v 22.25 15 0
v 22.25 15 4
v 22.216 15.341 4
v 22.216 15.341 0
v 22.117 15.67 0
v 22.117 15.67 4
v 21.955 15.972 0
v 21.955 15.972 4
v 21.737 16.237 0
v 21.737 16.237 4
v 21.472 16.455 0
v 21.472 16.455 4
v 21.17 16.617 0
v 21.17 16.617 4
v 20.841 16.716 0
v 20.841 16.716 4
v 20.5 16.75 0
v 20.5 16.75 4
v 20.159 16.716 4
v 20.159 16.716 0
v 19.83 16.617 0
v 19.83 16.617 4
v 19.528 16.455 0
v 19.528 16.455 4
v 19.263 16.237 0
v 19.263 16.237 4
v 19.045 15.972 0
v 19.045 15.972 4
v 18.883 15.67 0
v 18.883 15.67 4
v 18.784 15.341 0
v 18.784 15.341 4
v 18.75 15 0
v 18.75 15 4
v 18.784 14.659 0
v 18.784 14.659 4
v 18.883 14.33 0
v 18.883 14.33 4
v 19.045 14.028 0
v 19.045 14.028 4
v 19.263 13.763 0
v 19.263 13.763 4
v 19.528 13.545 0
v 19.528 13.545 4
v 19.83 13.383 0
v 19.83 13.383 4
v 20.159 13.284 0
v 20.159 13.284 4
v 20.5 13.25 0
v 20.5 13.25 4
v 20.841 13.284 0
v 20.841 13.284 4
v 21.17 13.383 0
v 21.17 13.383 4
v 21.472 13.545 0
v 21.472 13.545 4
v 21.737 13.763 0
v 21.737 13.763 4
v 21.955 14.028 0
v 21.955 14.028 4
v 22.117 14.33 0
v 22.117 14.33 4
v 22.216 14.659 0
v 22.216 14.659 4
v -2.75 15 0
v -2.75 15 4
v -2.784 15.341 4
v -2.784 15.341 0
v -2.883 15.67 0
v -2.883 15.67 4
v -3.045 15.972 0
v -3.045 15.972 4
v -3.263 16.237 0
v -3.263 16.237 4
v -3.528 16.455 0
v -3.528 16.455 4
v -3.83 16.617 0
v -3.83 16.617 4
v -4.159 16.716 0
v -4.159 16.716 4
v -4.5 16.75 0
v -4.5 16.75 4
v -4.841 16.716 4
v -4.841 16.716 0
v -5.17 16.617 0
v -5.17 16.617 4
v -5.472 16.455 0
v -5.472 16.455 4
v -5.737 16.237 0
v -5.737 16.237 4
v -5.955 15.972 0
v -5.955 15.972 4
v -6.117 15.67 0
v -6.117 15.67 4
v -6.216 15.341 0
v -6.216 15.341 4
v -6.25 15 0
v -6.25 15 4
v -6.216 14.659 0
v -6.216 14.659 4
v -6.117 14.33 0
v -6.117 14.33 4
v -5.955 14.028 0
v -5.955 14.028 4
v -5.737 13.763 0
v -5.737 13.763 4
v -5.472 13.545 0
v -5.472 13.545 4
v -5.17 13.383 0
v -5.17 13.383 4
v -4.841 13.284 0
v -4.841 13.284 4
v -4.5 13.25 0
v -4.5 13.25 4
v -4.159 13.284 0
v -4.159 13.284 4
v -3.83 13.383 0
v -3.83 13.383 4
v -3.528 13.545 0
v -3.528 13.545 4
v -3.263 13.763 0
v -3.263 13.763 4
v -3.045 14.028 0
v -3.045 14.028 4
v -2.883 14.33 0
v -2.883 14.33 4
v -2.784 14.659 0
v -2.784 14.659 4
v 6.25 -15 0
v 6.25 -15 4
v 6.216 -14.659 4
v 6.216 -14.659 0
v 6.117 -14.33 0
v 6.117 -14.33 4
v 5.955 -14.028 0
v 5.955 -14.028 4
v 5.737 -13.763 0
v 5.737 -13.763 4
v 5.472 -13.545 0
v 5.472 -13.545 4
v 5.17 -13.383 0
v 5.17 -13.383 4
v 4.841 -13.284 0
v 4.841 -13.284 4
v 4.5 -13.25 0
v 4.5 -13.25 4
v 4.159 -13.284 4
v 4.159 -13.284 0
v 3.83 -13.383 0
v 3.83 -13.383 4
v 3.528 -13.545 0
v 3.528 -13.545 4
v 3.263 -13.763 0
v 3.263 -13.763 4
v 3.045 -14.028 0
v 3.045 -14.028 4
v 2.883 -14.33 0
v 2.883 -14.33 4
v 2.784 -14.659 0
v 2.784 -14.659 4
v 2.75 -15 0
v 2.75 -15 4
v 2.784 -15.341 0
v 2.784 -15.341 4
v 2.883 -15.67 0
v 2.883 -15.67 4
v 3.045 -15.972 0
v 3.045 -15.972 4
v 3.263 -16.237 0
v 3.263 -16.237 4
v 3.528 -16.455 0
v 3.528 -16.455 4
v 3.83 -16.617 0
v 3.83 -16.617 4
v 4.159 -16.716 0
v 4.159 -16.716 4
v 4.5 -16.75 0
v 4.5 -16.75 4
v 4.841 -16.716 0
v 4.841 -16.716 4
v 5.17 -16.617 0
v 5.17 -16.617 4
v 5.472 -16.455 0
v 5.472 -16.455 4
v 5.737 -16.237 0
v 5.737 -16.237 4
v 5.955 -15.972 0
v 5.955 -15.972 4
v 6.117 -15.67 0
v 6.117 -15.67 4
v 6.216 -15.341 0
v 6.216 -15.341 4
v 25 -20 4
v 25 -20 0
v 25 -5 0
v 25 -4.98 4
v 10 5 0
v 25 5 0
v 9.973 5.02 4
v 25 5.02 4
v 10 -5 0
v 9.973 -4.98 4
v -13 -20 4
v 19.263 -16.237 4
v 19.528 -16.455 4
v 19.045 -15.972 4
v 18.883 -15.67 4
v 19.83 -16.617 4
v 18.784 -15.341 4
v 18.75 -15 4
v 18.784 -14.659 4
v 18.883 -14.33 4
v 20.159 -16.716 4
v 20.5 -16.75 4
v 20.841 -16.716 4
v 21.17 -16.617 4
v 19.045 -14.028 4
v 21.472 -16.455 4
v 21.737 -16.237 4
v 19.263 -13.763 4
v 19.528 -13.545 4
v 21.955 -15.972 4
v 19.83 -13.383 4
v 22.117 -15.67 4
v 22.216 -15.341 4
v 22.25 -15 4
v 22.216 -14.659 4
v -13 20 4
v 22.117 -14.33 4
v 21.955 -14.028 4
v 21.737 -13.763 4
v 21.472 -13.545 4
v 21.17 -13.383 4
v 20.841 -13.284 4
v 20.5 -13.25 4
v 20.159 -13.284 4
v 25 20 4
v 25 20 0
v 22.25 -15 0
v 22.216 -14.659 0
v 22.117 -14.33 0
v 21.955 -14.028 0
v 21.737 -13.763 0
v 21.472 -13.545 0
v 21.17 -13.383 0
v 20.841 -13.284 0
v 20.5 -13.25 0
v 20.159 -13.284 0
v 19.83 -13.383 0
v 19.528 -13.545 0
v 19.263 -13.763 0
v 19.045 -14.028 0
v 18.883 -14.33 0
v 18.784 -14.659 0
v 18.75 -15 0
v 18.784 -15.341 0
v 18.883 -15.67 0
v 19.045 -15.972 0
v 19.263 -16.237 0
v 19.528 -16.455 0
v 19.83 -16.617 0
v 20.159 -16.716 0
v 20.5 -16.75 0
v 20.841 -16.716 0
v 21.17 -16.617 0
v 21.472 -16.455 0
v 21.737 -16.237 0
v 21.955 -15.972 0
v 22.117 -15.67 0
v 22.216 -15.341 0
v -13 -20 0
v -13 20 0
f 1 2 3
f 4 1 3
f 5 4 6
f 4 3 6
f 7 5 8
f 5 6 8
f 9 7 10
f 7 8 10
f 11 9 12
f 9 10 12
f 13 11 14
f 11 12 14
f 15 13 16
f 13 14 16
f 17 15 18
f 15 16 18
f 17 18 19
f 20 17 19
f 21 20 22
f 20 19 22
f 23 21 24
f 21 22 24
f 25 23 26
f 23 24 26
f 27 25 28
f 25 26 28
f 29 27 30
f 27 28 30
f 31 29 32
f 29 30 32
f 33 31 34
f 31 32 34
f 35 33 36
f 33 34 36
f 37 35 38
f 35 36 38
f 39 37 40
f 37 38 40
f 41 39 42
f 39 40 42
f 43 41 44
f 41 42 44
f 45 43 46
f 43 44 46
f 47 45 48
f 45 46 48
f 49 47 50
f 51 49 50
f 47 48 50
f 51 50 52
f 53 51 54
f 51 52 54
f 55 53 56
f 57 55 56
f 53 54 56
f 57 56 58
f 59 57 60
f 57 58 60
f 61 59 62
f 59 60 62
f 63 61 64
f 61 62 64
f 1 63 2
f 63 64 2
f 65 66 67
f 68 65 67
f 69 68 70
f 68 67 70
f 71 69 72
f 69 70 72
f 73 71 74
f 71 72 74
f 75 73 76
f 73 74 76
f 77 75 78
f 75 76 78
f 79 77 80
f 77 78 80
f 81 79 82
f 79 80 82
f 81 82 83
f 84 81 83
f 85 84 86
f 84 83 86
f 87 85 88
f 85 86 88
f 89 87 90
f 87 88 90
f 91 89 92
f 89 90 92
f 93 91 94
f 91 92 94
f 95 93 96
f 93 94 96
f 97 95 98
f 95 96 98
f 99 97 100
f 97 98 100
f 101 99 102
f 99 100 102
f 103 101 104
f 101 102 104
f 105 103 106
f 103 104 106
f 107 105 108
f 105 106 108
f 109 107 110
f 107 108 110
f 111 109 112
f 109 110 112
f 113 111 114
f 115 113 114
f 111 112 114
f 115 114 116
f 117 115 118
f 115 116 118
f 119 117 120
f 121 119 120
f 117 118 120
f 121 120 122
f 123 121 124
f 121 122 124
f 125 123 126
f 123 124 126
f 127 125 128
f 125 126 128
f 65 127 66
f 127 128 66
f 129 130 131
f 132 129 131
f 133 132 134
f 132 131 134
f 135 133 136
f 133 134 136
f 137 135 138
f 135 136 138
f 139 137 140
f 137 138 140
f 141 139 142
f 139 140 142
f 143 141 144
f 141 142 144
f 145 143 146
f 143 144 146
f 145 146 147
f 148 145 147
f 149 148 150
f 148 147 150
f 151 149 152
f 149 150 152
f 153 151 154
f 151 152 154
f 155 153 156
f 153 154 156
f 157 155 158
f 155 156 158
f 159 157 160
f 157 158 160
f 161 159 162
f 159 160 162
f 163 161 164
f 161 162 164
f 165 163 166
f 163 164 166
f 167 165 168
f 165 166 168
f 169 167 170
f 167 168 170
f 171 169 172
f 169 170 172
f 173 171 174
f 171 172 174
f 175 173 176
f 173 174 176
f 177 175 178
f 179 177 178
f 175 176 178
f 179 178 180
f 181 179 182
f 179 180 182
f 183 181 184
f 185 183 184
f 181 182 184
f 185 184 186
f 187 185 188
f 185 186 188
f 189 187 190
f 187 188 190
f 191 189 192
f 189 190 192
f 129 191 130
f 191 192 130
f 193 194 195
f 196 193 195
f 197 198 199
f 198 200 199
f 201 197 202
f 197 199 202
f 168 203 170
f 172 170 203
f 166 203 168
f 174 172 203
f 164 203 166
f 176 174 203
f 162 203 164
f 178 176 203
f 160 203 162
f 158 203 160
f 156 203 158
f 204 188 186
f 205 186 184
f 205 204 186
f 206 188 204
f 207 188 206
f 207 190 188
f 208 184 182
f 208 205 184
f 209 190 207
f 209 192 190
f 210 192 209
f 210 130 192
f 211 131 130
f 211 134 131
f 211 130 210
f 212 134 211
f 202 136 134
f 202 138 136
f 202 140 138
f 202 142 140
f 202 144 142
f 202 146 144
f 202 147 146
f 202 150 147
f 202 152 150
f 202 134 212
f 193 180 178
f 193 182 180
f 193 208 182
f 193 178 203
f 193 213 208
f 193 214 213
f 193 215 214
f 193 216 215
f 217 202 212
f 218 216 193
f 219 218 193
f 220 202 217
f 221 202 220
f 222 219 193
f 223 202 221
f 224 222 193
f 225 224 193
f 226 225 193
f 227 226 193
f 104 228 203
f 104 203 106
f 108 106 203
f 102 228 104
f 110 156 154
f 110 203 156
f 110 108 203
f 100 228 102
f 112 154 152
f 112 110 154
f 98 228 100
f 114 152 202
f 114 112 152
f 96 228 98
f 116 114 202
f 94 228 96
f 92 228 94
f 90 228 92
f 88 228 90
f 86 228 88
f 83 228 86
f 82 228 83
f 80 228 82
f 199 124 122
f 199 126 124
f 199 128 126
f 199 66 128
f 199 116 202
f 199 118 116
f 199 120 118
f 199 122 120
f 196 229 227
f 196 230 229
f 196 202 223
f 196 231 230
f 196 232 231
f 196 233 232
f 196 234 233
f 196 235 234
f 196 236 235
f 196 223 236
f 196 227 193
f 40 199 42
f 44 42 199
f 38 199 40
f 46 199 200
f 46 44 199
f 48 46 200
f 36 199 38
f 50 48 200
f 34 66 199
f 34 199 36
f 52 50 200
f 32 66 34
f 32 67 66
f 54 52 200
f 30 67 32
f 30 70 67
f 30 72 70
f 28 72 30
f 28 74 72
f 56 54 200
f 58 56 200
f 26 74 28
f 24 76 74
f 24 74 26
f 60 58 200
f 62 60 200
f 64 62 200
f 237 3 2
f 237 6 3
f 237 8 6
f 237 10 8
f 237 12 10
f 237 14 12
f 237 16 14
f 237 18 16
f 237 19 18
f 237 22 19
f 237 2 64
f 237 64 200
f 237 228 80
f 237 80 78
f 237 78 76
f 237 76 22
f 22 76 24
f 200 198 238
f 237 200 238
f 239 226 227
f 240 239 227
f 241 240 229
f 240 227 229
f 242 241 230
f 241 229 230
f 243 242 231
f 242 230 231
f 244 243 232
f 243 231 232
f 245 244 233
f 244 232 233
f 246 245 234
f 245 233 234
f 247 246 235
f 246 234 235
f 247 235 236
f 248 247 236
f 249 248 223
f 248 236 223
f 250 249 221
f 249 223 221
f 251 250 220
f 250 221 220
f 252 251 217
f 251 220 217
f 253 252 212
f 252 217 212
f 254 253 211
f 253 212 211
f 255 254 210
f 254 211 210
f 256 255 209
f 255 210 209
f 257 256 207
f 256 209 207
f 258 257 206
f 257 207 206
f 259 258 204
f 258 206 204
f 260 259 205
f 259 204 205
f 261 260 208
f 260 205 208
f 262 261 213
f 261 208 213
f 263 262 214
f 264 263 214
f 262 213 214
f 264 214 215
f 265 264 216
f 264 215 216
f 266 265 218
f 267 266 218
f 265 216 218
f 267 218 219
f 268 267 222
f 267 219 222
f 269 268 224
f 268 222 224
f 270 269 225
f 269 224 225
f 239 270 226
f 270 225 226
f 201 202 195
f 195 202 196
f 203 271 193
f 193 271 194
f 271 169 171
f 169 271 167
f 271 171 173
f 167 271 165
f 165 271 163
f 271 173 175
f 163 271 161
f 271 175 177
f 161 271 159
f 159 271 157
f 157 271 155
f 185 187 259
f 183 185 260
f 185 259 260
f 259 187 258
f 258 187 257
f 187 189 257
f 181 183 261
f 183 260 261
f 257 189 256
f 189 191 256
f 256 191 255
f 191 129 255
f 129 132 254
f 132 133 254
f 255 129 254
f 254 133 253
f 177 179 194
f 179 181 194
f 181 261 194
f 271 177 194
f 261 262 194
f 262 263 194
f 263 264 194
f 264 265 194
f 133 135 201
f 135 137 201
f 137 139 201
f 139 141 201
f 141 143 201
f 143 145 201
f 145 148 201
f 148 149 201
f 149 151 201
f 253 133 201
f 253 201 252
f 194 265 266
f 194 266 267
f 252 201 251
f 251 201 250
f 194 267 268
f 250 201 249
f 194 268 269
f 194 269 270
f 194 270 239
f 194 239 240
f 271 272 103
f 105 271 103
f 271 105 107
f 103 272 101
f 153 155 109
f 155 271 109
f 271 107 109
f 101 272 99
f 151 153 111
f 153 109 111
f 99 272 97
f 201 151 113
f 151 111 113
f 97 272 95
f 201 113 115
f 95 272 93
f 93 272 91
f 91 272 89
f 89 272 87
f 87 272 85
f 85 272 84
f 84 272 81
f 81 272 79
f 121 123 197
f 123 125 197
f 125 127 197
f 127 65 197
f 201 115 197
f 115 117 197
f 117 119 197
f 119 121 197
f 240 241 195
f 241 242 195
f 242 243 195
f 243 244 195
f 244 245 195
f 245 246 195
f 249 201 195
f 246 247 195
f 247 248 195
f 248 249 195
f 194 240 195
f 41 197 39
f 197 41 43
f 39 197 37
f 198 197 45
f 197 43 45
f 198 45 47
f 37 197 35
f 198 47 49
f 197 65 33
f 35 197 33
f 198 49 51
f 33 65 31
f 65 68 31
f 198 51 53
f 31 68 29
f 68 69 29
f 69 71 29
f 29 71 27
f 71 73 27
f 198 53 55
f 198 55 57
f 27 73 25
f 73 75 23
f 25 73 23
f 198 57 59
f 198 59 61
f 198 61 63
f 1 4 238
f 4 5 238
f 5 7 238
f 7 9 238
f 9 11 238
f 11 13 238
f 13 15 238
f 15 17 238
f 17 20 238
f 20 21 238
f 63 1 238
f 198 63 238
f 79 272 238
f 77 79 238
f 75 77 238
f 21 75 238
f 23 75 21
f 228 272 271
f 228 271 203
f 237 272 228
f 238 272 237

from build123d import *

# Parameters (mm, degrees)
SKETCH_1_W          = 50
SKETCH_1_H          = 40
EXTRUDE_1_DEPTH     = 4
SKETCH_2_R          = 1.75
CUT_EXTRUDE_1_DEPTH = 4
SKETCH_3_W          = 4
SKETCH_3_H          = 40
CUT_EXTRUDE_2_DEPTH = 12
SKETCH_8_W          = 16
SKETCH_8_H          = 10
SKETCH_11_W         = 16
SKETCH_11_H         = 10


with BuildPart() as part:
    # 草图1 → 凸台-拉伸1 (new body)
    with BuildSketch(Plane.XY):
        Rectangle(SKETCH_1_W, SKETCH_1_H)
    extrude(amount=EXTRUDE_1_DEPTH)

    # 草图2 → 切除-拉伸1 (cut)
    with BuildSketch(Plane.XY.offset(4)):
        with Locations((-20.5, 15)):
            Circle(SKETCH_2_R)
        with Locations((-4.5, 15)):
            Circle(SKETCH_2_R)
        with Locations((20.5, 15)):
            Circle(SKETCH_2_R)
        with Locations((20.5, -15)):
            Circle(SKETCH_2_R)
        with Locations((4.5, -15)):
            Circle(SKETCH_2_R)
        with Locations((-20.5, -15)):
            Circle(SKETCH_2_R)
    extrude(amount=-CUT_EXTRUDE_1_DEPTH, mode=Mode.SUBTRACT)

    # 草图3 → 切除-拉伸2 (cut)
    with BuildSketch(Plane.ZY.offset(25)):
        with Locations((2, 0)):
            Rectangle(SKETCH_3_W, SKETCH_3_H)
    extrude(amount=-CUT_EXTRUDE_2_DEPTH, mode=Mode.SUBTRACT)

    # 草图8 → 切除-放样5 section 0
    with BuildSketch(Plane.XY):
        with Locations((18, 0)):
            Rectangle(SKETCH_8_W, SKETCH_8_H)
    # 草图11 → 切除-放样5 section 1
    with BuildSketch(Plane.XY.offset(4)):
        with Locations((17.972560725, 0.020424216)):
            Rectangle(SKETCH_11_W, SKETCH_11_H)
    loft(mode=Mode.SUBTRACT)


solid = part.part
